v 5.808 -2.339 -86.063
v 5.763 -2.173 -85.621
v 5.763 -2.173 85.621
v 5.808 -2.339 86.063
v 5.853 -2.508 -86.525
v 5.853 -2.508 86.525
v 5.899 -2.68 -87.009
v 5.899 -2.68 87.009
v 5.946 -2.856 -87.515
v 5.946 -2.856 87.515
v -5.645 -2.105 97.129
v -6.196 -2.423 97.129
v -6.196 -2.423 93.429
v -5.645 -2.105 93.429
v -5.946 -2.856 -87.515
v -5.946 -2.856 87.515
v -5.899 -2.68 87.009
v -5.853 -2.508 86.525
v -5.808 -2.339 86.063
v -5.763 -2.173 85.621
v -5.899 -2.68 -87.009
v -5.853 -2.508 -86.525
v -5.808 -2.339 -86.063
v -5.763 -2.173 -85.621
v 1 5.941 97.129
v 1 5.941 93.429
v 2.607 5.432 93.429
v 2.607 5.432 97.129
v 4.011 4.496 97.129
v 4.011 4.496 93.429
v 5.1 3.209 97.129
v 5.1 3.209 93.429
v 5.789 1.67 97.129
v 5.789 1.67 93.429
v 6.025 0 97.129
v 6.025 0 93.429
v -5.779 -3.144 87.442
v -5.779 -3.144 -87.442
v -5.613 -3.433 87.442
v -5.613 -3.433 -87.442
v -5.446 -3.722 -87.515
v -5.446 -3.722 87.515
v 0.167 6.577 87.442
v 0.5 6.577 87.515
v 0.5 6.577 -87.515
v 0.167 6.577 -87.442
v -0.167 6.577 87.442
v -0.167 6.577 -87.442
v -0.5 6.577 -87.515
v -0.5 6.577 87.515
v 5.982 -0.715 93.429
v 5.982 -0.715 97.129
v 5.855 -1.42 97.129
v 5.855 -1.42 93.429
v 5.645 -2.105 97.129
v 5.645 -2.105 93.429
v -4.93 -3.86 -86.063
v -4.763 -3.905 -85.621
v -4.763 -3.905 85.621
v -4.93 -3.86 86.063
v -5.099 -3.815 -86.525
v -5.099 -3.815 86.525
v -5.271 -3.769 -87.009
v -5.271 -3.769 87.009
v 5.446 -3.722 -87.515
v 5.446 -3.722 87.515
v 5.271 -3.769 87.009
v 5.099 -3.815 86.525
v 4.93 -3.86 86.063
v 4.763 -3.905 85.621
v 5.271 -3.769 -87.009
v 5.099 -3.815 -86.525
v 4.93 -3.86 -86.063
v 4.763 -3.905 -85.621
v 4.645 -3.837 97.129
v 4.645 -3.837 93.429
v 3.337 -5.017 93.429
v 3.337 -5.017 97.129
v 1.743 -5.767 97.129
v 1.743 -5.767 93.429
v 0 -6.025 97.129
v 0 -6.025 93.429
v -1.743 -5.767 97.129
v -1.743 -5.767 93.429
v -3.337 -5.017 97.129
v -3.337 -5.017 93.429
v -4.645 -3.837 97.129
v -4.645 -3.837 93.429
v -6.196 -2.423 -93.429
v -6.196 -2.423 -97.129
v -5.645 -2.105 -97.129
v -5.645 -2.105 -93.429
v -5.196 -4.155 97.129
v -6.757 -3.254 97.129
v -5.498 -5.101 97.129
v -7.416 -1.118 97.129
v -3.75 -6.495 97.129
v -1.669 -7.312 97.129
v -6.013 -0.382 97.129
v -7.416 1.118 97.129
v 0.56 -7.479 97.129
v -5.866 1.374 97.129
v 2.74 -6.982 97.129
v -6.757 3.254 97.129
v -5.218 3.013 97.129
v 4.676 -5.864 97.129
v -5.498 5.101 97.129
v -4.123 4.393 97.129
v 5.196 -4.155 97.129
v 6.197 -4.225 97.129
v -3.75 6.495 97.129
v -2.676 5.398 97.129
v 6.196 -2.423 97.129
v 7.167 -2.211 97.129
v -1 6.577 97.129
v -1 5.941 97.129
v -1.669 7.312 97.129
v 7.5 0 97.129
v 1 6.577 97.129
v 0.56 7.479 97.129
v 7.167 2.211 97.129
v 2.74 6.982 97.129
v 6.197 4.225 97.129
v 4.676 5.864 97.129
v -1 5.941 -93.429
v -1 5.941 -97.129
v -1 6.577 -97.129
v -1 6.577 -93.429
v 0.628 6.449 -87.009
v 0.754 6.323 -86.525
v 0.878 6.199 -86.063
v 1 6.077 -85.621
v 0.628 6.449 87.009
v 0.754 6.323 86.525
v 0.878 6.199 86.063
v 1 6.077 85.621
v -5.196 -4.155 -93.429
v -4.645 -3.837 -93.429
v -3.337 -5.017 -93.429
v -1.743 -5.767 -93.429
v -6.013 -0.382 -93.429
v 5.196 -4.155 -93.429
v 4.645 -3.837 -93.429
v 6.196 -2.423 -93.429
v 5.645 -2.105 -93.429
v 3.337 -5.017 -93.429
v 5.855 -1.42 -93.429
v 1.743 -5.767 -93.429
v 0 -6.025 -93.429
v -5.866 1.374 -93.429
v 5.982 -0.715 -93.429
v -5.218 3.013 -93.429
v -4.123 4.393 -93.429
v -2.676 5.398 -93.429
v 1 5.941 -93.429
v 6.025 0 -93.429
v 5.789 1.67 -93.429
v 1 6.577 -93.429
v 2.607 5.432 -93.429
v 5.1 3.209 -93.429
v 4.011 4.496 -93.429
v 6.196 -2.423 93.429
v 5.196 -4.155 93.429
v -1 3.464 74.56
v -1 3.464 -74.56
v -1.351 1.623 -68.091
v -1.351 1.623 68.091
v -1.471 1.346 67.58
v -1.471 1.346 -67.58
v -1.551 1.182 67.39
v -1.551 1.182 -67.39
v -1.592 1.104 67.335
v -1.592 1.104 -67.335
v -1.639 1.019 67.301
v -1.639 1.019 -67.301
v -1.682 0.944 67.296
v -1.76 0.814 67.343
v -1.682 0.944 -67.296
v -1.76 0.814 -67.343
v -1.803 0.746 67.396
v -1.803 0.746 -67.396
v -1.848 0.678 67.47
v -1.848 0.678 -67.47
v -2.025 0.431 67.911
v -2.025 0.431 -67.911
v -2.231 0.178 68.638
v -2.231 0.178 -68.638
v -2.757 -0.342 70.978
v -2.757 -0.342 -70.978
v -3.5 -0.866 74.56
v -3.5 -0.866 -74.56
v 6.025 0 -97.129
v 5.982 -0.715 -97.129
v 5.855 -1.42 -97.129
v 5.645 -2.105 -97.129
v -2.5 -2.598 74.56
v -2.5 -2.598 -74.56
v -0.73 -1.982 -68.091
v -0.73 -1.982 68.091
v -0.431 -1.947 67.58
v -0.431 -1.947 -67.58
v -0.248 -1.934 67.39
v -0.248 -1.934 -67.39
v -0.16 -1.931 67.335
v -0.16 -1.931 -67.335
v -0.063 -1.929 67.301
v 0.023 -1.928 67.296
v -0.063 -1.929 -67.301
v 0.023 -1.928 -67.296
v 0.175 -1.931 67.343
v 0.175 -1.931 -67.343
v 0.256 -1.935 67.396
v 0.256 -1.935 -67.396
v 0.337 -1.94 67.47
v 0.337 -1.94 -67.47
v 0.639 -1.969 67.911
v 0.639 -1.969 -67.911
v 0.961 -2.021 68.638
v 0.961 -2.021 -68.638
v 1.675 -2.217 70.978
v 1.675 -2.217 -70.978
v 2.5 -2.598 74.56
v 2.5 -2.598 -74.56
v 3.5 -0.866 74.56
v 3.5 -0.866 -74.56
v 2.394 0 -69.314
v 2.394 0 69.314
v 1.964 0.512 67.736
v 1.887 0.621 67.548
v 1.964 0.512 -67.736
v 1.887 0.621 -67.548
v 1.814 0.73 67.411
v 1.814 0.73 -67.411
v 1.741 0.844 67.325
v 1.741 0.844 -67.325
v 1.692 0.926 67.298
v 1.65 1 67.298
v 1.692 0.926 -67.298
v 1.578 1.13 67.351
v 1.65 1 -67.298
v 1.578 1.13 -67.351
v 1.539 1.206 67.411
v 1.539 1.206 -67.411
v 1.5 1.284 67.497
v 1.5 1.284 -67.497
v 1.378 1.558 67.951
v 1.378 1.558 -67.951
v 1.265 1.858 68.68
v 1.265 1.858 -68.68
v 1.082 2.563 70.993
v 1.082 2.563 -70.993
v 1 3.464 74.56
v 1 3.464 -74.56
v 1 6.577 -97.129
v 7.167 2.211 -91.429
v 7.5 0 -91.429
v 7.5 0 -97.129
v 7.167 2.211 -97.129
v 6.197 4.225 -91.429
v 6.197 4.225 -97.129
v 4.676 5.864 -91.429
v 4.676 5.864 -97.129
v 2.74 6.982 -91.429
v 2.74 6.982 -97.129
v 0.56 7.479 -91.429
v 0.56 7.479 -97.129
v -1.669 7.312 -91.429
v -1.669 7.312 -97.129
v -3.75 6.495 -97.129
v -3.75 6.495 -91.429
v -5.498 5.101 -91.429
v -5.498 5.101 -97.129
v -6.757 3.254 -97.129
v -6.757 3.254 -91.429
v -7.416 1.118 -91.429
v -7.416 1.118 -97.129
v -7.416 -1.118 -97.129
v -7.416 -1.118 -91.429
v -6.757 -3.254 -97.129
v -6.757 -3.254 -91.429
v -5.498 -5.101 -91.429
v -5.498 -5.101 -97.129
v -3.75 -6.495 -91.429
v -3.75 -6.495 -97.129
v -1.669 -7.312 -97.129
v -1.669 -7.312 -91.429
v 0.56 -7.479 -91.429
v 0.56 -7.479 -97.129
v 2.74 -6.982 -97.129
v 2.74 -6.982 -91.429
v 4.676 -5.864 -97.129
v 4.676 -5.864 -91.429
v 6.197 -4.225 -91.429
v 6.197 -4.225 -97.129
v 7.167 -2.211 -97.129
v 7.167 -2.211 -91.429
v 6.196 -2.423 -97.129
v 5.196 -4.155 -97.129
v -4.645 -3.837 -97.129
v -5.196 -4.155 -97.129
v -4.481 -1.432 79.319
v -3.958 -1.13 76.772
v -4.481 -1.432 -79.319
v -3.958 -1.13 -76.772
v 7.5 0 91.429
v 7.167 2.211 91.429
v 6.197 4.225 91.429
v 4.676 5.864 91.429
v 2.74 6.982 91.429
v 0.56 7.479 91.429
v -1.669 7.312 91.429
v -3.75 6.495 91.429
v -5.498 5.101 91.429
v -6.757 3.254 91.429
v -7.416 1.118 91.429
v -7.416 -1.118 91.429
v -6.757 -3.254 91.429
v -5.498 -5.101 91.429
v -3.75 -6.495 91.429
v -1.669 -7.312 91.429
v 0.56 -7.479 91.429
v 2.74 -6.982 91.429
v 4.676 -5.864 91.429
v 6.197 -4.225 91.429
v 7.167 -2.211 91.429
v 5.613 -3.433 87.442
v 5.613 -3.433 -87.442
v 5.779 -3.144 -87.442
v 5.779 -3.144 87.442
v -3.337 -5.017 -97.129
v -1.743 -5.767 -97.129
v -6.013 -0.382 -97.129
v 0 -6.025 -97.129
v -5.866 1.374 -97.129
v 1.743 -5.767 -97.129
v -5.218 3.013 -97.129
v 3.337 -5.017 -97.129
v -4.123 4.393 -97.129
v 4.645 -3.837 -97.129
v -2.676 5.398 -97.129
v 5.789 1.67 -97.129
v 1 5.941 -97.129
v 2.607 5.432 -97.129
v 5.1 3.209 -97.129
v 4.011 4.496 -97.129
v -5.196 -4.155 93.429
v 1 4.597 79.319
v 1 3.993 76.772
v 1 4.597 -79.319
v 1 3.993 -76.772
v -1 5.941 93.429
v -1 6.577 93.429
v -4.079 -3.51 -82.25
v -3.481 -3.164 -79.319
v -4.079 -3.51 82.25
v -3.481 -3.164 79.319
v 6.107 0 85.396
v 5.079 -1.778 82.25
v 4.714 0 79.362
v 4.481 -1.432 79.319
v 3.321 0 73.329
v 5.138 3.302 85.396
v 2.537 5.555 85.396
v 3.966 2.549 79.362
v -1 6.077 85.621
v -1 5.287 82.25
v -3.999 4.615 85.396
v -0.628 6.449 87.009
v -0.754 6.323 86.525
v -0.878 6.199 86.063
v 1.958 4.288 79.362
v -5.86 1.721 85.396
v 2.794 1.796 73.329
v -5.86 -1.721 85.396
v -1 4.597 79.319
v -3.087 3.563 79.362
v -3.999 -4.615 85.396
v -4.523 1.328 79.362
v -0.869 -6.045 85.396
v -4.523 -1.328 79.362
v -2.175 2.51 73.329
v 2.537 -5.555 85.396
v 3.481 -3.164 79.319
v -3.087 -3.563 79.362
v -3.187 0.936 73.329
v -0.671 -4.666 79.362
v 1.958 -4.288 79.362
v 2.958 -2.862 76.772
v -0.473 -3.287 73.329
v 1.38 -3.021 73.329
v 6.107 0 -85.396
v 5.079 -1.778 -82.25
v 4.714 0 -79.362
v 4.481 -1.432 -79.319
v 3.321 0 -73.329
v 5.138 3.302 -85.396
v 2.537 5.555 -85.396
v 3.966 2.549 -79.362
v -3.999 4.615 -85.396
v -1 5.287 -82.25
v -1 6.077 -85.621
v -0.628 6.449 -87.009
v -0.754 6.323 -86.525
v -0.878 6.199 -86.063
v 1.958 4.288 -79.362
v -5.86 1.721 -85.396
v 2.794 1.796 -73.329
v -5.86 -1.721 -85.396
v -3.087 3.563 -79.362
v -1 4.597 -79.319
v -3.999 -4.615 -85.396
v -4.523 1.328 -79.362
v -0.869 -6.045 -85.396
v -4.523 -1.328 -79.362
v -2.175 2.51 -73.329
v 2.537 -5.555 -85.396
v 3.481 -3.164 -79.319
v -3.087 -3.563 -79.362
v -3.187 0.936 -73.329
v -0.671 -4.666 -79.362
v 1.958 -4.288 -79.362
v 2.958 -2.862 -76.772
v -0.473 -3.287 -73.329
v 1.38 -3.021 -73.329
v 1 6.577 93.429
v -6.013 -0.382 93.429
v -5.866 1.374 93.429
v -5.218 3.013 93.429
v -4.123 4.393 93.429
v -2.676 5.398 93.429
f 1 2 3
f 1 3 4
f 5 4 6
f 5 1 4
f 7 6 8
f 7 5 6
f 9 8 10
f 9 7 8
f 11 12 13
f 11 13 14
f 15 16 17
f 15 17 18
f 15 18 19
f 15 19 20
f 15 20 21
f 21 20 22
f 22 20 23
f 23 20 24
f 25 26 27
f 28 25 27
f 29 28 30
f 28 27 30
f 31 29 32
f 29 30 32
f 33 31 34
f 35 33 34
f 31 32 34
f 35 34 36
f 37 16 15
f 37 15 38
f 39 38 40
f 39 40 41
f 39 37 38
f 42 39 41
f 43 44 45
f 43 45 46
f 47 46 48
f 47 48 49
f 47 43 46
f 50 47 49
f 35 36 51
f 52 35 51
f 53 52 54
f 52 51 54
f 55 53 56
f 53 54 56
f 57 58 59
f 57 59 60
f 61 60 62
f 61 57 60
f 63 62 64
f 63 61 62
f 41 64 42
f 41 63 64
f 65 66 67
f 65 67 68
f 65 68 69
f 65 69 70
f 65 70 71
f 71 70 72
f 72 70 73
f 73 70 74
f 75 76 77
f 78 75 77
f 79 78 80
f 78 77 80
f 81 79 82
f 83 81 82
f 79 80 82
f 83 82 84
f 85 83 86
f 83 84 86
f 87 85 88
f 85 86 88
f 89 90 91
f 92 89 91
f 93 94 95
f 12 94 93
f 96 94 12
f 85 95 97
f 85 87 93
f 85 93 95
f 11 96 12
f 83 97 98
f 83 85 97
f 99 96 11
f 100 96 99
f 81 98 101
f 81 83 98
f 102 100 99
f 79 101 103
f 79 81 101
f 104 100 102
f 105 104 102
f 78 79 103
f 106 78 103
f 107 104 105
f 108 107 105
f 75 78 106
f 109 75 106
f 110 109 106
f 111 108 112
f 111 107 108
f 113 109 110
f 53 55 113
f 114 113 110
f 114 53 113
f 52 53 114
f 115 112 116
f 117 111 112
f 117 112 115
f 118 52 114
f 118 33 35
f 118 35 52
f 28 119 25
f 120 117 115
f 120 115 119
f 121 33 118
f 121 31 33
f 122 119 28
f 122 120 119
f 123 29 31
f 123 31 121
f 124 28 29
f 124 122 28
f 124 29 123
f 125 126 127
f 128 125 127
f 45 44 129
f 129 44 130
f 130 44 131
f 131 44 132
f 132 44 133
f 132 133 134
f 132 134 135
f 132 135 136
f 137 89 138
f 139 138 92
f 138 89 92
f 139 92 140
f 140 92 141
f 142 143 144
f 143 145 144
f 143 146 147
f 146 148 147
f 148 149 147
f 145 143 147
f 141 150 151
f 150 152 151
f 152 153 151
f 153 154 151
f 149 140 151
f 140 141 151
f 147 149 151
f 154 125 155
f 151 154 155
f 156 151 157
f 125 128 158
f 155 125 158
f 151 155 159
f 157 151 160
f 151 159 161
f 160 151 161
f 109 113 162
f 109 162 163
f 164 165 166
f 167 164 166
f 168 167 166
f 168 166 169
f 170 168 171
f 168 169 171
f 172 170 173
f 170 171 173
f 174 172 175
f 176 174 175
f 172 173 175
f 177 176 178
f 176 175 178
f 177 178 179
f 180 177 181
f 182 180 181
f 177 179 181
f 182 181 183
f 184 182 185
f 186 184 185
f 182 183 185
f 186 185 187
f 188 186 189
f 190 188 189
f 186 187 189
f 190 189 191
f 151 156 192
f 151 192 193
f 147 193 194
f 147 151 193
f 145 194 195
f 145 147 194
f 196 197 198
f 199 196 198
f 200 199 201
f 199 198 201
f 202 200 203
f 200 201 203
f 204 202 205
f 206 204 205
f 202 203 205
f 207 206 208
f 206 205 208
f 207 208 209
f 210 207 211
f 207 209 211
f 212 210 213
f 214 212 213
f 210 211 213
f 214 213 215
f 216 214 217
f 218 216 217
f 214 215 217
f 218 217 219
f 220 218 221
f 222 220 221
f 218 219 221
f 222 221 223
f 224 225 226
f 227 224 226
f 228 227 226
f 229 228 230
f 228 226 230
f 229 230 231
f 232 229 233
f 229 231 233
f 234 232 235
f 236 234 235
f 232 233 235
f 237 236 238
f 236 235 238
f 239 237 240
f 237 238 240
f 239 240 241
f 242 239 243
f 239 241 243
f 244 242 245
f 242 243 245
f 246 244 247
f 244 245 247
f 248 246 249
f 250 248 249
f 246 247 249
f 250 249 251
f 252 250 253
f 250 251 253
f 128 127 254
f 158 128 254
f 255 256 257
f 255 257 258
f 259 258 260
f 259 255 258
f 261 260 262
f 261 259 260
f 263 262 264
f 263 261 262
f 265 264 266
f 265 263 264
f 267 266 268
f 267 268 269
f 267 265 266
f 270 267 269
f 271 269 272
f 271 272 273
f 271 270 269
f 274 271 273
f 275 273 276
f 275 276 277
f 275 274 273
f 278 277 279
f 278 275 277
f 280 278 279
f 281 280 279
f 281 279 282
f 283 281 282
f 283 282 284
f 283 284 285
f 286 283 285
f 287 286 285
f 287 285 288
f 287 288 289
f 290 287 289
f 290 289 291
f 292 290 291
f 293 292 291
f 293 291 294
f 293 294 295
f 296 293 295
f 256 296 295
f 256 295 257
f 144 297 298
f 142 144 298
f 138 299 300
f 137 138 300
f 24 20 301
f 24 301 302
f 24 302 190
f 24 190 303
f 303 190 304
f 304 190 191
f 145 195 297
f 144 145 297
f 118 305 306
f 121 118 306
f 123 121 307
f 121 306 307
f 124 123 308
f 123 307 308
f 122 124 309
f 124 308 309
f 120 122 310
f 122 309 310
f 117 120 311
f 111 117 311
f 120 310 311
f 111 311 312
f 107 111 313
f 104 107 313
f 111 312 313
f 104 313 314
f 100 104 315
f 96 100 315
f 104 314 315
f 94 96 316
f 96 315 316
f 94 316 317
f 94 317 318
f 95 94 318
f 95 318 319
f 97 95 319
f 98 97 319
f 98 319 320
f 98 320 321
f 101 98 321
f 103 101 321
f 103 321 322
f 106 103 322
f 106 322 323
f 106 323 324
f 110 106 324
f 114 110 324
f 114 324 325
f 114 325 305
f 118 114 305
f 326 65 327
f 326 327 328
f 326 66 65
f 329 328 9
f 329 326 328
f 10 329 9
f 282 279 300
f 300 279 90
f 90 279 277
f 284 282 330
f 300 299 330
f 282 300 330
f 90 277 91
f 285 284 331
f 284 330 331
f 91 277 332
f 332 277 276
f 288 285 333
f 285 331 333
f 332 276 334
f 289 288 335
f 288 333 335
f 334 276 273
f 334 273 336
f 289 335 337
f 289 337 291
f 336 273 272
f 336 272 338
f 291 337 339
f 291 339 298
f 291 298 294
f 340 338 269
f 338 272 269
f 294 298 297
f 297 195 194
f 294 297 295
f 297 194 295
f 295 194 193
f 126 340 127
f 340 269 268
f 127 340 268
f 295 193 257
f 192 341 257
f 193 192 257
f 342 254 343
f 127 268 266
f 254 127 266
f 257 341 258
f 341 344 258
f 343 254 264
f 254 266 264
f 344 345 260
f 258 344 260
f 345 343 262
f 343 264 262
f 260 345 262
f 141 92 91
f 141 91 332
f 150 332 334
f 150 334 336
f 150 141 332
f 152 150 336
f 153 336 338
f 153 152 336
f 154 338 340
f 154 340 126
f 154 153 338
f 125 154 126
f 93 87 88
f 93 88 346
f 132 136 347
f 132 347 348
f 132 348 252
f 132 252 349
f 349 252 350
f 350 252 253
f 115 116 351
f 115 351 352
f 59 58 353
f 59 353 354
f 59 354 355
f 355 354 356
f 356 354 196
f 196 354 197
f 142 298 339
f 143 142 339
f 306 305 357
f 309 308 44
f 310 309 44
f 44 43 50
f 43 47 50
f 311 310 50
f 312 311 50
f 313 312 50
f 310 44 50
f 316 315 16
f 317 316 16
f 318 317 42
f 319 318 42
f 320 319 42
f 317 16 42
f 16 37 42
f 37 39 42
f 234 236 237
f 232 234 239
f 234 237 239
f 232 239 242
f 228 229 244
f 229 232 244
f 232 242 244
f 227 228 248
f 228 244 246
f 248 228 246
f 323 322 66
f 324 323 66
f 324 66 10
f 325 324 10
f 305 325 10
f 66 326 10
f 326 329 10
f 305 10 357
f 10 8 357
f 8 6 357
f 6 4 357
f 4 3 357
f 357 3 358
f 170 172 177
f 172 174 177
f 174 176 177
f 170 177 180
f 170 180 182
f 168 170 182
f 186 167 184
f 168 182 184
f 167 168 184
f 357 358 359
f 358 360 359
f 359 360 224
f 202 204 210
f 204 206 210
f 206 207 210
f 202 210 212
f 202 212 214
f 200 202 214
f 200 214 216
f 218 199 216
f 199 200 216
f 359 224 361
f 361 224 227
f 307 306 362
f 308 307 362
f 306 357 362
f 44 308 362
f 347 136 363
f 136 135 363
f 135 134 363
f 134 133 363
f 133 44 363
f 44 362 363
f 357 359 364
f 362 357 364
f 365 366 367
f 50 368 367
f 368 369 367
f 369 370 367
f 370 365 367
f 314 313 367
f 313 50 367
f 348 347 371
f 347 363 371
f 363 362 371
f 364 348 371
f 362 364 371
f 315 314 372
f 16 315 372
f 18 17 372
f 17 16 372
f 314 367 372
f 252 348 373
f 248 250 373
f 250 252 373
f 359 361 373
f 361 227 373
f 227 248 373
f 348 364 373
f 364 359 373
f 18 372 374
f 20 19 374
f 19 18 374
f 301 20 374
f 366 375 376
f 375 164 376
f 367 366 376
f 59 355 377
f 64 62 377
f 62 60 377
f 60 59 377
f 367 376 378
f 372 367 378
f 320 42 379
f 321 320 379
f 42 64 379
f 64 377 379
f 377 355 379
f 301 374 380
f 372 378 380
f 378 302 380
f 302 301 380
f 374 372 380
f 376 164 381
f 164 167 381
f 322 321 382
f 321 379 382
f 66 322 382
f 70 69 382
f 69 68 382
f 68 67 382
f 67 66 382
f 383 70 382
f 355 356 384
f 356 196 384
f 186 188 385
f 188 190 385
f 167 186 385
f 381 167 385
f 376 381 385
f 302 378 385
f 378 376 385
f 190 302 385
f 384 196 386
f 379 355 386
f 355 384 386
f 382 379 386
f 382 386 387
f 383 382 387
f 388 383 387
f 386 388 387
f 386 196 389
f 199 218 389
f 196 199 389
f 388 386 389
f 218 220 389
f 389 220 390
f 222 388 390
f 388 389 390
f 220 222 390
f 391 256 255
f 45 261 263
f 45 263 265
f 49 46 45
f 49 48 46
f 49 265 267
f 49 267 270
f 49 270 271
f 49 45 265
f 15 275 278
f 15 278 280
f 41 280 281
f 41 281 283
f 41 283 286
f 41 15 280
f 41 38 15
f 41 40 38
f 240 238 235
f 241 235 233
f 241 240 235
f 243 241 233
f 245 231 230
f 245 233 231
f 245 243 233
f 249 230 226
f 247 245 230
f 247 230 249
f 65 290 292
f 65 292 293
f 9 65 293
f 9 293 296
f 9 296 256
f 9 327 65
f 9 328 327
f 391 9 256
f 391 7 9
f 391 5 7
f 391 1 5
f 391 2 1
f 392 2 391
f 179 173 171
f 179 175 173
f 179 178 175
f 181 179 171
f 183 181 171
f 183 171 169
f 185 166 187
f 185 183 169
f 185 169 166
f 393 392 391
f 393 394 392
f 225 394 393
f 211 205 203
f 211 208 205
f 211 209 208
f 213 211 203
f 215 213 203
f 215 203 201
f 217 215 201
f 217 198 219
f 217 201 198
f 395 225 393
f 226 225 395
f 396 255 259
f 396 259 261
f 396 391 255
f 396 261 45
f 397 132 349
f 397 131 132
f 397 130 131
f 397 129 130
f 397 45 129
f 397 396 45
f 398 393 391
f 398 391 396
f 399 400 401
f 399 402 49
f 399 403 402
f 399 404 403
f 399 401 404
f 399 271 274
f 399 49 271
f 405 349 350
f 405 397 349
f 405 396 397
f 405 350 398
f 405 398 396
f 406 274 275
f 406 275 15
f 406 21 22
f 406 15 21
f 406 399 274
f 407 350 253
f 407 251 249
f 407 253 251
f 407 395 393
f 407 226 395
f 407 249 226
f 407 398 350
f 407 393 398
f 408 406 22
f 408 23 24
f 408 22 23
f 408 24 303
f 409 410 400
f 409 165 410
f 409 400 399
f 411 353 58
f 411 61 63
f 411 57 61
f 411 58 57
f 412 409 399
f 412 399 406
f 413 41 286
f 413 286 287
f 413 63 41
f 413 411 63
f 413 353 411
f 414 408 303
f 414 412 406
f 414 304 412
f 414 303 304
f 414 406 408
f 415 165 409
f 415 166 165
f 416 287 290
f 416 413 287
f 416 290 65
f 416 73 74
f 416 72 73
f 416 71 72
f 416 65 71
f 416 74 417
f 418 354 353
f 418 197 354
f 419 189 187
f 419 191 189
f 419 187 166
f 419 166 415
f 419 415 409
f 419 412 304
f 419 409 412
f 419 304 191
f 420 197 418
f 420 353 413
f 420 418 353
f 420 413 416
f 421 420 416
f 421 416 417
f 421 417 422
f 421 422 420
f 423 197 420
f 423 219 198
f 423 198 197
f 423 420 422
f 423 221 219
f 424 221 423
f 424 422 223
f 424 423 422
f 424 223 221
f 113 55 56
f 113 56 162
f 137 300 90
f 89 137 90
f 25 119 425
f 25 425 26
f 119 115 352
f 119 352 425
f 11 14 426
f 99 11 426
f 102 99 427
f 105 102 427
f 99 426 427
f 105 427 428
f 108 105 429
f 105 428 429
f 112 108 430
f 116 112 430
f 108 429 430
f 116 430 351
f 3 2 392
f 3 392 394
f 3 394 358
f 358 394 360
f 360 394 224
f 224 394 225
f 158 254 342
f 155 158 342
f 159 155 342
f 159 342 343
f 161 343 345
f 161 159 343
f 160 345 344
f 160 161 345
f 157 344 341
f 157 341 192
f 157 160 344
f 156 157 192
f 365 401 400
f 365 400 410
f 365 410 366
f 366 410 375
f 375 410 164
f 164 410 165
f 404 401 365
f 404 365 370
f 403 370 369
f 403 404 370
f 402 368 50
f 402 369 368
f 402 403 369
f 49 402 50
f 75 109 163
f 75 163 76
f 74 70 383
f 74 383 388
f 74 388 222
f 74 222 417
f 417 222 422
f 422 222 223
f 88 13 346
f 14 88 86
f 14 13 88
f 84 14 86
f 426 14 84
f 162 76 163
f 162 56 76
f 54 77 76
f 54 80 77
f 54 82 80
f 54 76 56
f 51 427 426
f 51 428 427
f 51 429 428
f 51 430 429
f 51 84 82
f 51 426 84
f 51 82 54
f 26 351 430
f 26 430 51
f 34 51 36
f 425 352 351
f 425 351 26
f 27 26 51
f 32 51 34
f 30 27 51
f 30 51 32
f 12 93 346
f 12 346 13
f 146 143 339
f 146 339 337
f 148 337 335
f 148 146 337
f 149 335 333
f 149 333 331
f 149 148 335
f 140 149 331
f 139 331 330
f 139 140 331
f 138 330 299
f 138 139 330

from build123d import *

# Parameters (mm, degrees)
F1_DEPTH = 91.42907
F2_R     = 7.5
F3_DEPTH = 2
F4_DEPTH = 5.7
F5_R     = 5
F6_DEPTH = 25
F6_TAPER = 13
F7_SIZE  = 0.5


with BuildPart() as f1:
    # F0 (on Top) → F1 (new body)
    with BuildSketch(Plane.XY):
        Polygon((1, 6.5773502692), (-1, 6.5773502692), (-1, 0.5773502692), (-6.1961524227, -2.4226497308), (-5.1961524227, -4.1547005384), (0, -1.1547005384), (5.1961524227, -4.1547005384), (6.1961524227, -2.4226497308), (1, 0.5773502692), align=None)
    extrude(amount=F1_DEPTH)

    # F2 (on face) → F3 (join)
    with BuildSketch(Plane.XY.offset(91.42907)):
        Circle(F2_R)
        with BuildLine():
            ThreePointArc((1, 5.941432908), (4.6003056964, 3.8907341852), (6.025, 0))
            ThreePointArc((6.025, 0), (5.9293486908, -1.0693217956), (5.6454318332, -2.1046910502))
            Line((5.6454318332, -2.1046910502), (6.1961524227, -2.4226497308))
            Line((6.1961524227, -2.4226497308), (5.1961524227, -4.1547005384))
            Line((5.1961524227, -4.1547005384), (4.6454318332, -3.8367418578))
            ThreePointArc((4.6454318332, -3.8367418578), (0, -6.025), (-4.6454318332, -3.8367418578))
            Line((-4.6454318332, -3.8367418578), (-5.1961524227, -4.1547005384))
            Line((-5.1961524227, -4.1547005384), (-6.1961524227, -2.4226497308))
            Line((-6.1961524227, -2.4226497308), (-5.6454318332, -2.1046910502))
            ThreePointArc((-5.6454318332, -2.1046910502), (-5.2178030578, 3.0125), (-1, 5.941432908))
            Line((-1, 5.941432908), (-1, 6.5773502692))
            Line((-1, 6.5773502692), (1, 6.5773502692))
            Line((1, 6.5773502692), (1, 5.941432908))
        make_face(mode=Mode.SUBTRACT)
        with BuildLine():
            Line((1, 0.5773502692), (1, 5.941432908))
            ThreePointArc((1, 5.941432908), (0, 6.025), (-1, 5.941432908))
            Line((-1, 5.941432908), (-1, 0.5773502692))
            Line((-1, 0.5773502692), (-5.6454318332, -2.1046910502))
            ThreePointArc((-5.6454318332, -2.1046910502), (-5.2178030578, -3.0125), (-4.6454318332, -3.8367418578))
            Line((-4.6454318332, -3.8367418578), (0, -1.1547005384))
            Line((0, -1.1547005384), (4.6454318332, -3.8367418578))
            ThreePointArc((4.6454318332, -3.8367418578), (5.2178030578, -3.0125), (5.6454318332, -2.1046910502))
            Line((5.6454318332, -2.1046910502), (1, 0.5773502692))
        make_face()
        with BuildLine():
            ThreePointArc((5.6454318332, -2.1046910502), (5.9293486908, -1.0693217956), (6.025, 0))
            ThreePointArc((6.025, 0), (4.6003056964, 3.8907341852), (1, 5.941432908))
            Line((1, 5.941432908), (1, 0.5773502692))
            Line((1, 0.5773502692), (5.6454318332, -2.1046910502))
        make_face()
        with BuildLine():
            ThreePointArc((-4.6454318332, -3.8367418578), (0, -6.025), (4.6454318332, -3.8367418578))
            Line((4.6454318332, -3.8367418578), (0, -1.1547005384))
            Line((0, -1.1547005384), (-4.6454318332, -3.8367418578))
        make_face()
        with BuildLine():
            Line((-1, 0.5773502692), (-1, 5.941432908))
            ThreePointArc((-1, 5.941432908), (-5.2178030578, 3.0125), (-5.6454318332, -2.1046910502))
            Line((-5.6454318332, -2.1046910502), (-1, 0.5773502692))
        make_face()
        with BuildLine():
            ThreePointArc((-4.6454318332, -3.8367418578), (-5.2178030578, -3.0125), (-5.6454318332, -2.1046910502))
            Line((-5.6454318332, -2.1046910502), (-6.1961524227, -2.4226497308))
            Line((-6.1961524227, -2.4226497308), (-5.1961524227, -4.1547005384))
            Line((-5.1961524227, -4.1547005384), (-4.6454318332, -3.8367418578))
        make_face()
        with BuildLine():
            Line((6.1961524227, -2.4226497308), (5.6454318332, -2.1046910502))
            ThreePointArc((5.6454318332, -2.1046910502), (5.2178030578, -3.0125), (4.6454318332, -3.8367418578))
            Line((4.6454318332, -3.8367418578), (5.1961524227, -4.1547005384))
            Line((5.1961524227, -4.1547005384), (6.1961524227, -2.4226497308))
        make_face()
        with BuildLine():
            ThreePointArc((-1, 5.941432908), (0, 6.025), (1, 5.941432908))
            Line((1, 5.941432908), (1, 6.5773502692))
            Line((1, 6.5773502692), (-1, 6.5773502692))
            Line((-1, 6.5773502692), (-1, 5.941432908))
        make_face()
    extrude(amount=F3_DEPTH)

    # F2 (on face) → F4 (join)
    with BuildSketch(Plane.XY.offset(91.42907)):
        Circle(F2_R)
        with BuildLine():
            ThreePointArc((1, 5.941432908), (4.6003056964, 3.8907341852), (6.025, 0))
            ThreePointArc((6.025, 0), (5.9293486908, -1.0693217956), (5.6454318332, -2.1046910502))
            Line((5.6454318332, -2.1046910502), (6.1961524227, -2.4226497308))
            Line((6.1961524227, -2.4226497308), (5.1961524227, -4.1547005384))
            Line((5.1961524227, -4.1547005384), (4.6454318332, -3.8367418578))
            ThreePointArc((4.6454318332, -3.8367418578), (0, -6.025), (-4.6454318332, -3.8367418578))
            Line((-4.6454318332, -3.8367418578), (-5.1961524227, -4.1547005384))
            Line((-5.1961524227, -4.1547005384), (-6.1961524227, -2.4226497308))
            Line((-6.1961524227, -2.4226497308), (-5.6454318332, -2.1046910502))
            ThreePointArc((-5.6454318332, -2.1046910502), (-5.2178030578, 3.0125), (-1, 5.941432908))
            Line((-1, 5.941432908), (-1, 6.5773502692))
            Line((-1, 6.5773502692), (1, 6.5773502692))
            Line((1, 6.5773502692), (1, 5.941432908))
        make_face(mode=Mode.SUBTRACT)
    extrude(amount=F4_DEPTH)

    # F5
    f5_edges = [f1.edges().sort_by_distance(p)[0] for p in [
        (-1, 0.57735, 45.714535),
        (1, 0.57735, 45.714535),
        (0, -1.154701, 45.714535),
    ]]
    fillet(f5_edges, radius=F5_R)

    # F2 (on face) → F6 (join)
    with BuildSketch(Plane.XY.offset(91.42907)):
        Circle(F2_R)
        with BuildLine():
            ThreePointArc((1, 5.941432908), (4.6003056964, 3.8907341852), (6.025, 0))
            ThreePointArc((6.025, 0), (5.9293486908, -1.0693217956), (5.6454318332, -2.1046910502))
            Line((5.6454318332, -2.1046910502), (6.1961524227, -2.4226497308))
            Line((6.1961524227, -2.4226497308), (5.1961524227, -4.1547005384))
            Line((5.1961524227, -4.1547005384), (4.6454318332, -3.8367418578))
            ThreePointArc((4.6454318332, -3.8367418578), (0, -6.025), (-4.6454318332, -3.8367418578))
            Line((-4.6454318332, -3.8367418578), (-5.1961524227, -4.1547005384))
            Line((-5.1961524227, -4.1547005384), (-6.1961524227, -2.4226497308))
            Line((-6.1961524227, -2.4226497308), (-5.6454318332, -2.1046910502))
            ThreePointArc((-5.6454318332, -2.1046910502), (-5.2178030578, 3.0125), (-1, 5.941432908))
            Line((-1, 5.941432908), (-1, 6.5773502692))
            Line((-1, 6.5773502692), (1, 6.5773502692))
            Line((1, 6.5773502692), (1, 5.941432908))
        make_face(mode=Mode.SUBTRACT)
        with BuildLine():
            ThreePointArc((-4.6454318332, -3.8367418578), (-5.2178030578, -3.0125), (-5.6454318332, -2.1046910502))
            Line((-5.6454318332, -2.1046910502), (-6.1961524227, -2.4226497308))
            Line((-6.1961524227, -2.4226497308), (-5.1961524227, -4.1547005384))
            Line((-5.1961524227, -4.1547005384), (-4.6454318332, -3.8367418578))
        make_face()
        with BuildLine():
            Line((-1, 0.5773502692), (-1, 5.941432908))
            ThreePointArc((-1, 5.941432908), (-5.2178030578, 3.0125), (-5.6454318332, -2.1046910502))
            Line((-5.6454318332, -2.1046910502), (-1, 0.5773502692))
        make_face()
        with BuildLine():
            Line((1, 0.5773502692), (1, 5.941432908))
            ThreePointArc((1, 5.941432908), (0, 6.025), (-1, 5.941432908))
            Line((-1, 5.941432908), (-1, 0.5773502692))
            Line((-1, 0.5773502692), (-5.6454318332, -2.1046910502))
            ThreePointArc((-5.6454318332, -2.1046910502), (-5.2178030578, -3.0125), (-4.6454318332, -3.8367418578))
            Line((-4.6454318332, -3.8367418578), (0, -1.1547005384))
            Line((0, -1.1547005384), (4.6454318332, -3.8367418578))
            ThreePointArc((4.6454318332, -3.8367418578), (5.2178030578, -3.0125), (5.6454318332, -2.1046910502))
            Line((5.6454318332, -2.1046910502), (1, 0.5773502692))
        make_face()
        with BuildLine():
            ThreePointArc((-4.6454318332, -3.8367418578), (0, -6.025), (4.6454318332, -3.8367418578))
            Line((4.6454318332, -3.8367418578), (0, -1.1547005384))
            Line((0, -1.1547005384), (-4.6454318332, -3.8367418578))
        make_face()
        with BuildLine():
            ThreePointArc((5.6454318332, -2.1046910502), (5.9293486908, -1.0693217956), (6.025, 0))
            ThreePointArc((6.025, 0), (4.6003056964, 3.8907341852), (1, 5.941432908))
            Line((1, 5.941432908), (1, 0.5773502692))
            Line((1, 0.5773502692), (5.6454318332, -2.1046910502))
        make_face()
        with BuildLine():
            Line((6.1961524227, -2.4226497308), (5.6454318332, -2.1046910502))
            ThreePointArc((5.6454318332, -2.1046910502), (5.2178030578, -3.0125), (4.6454318332, -3.8367418578))
            Line((4.6454318332, -3.8367418578), (5.1961524227, -4.1547005384))
            Line((5.1961524227, -4.1547005384), (6.1961524227, -2.4226497308))
        make_face()
        with BuildLine():
            ThreePointArc((-1, 5.941432908), (0, 6.025), (1, 5.941432908))
            Line((1, 5.941432908), (1, 6.5773502692))
            Line((1, 6.5773502692), (-1, 6.5773502692))
            Line((-1, 6.5773502692), (-1, 5.941432908))
        make_face()
    extrude(amount=-F6_DEPTH, taper=F6_TAPER)

    # F7
    f7_edges = [f1.edges().sort_by_distance(p)[0] for p in [
        (-6.196152, -2.42265, 43.880013),
        (-1, 6.57735, 43.880013),
        (1, 6.57735, 43.880013),
        (6.196152, -2.42265, 43.880013),
        (5.196152, -4.154701, 43.880013),
        (-5.196152, -4.154701, 43.880013),
    ]]
    chamfer(f7_edges, length=F7_SIZE)

    # F8: F1 across plane


with BuildPart() as f1_1:
    add(f1.part)
    add(f1.part.mirror(Plane.XY))


solid = f1_1.part
